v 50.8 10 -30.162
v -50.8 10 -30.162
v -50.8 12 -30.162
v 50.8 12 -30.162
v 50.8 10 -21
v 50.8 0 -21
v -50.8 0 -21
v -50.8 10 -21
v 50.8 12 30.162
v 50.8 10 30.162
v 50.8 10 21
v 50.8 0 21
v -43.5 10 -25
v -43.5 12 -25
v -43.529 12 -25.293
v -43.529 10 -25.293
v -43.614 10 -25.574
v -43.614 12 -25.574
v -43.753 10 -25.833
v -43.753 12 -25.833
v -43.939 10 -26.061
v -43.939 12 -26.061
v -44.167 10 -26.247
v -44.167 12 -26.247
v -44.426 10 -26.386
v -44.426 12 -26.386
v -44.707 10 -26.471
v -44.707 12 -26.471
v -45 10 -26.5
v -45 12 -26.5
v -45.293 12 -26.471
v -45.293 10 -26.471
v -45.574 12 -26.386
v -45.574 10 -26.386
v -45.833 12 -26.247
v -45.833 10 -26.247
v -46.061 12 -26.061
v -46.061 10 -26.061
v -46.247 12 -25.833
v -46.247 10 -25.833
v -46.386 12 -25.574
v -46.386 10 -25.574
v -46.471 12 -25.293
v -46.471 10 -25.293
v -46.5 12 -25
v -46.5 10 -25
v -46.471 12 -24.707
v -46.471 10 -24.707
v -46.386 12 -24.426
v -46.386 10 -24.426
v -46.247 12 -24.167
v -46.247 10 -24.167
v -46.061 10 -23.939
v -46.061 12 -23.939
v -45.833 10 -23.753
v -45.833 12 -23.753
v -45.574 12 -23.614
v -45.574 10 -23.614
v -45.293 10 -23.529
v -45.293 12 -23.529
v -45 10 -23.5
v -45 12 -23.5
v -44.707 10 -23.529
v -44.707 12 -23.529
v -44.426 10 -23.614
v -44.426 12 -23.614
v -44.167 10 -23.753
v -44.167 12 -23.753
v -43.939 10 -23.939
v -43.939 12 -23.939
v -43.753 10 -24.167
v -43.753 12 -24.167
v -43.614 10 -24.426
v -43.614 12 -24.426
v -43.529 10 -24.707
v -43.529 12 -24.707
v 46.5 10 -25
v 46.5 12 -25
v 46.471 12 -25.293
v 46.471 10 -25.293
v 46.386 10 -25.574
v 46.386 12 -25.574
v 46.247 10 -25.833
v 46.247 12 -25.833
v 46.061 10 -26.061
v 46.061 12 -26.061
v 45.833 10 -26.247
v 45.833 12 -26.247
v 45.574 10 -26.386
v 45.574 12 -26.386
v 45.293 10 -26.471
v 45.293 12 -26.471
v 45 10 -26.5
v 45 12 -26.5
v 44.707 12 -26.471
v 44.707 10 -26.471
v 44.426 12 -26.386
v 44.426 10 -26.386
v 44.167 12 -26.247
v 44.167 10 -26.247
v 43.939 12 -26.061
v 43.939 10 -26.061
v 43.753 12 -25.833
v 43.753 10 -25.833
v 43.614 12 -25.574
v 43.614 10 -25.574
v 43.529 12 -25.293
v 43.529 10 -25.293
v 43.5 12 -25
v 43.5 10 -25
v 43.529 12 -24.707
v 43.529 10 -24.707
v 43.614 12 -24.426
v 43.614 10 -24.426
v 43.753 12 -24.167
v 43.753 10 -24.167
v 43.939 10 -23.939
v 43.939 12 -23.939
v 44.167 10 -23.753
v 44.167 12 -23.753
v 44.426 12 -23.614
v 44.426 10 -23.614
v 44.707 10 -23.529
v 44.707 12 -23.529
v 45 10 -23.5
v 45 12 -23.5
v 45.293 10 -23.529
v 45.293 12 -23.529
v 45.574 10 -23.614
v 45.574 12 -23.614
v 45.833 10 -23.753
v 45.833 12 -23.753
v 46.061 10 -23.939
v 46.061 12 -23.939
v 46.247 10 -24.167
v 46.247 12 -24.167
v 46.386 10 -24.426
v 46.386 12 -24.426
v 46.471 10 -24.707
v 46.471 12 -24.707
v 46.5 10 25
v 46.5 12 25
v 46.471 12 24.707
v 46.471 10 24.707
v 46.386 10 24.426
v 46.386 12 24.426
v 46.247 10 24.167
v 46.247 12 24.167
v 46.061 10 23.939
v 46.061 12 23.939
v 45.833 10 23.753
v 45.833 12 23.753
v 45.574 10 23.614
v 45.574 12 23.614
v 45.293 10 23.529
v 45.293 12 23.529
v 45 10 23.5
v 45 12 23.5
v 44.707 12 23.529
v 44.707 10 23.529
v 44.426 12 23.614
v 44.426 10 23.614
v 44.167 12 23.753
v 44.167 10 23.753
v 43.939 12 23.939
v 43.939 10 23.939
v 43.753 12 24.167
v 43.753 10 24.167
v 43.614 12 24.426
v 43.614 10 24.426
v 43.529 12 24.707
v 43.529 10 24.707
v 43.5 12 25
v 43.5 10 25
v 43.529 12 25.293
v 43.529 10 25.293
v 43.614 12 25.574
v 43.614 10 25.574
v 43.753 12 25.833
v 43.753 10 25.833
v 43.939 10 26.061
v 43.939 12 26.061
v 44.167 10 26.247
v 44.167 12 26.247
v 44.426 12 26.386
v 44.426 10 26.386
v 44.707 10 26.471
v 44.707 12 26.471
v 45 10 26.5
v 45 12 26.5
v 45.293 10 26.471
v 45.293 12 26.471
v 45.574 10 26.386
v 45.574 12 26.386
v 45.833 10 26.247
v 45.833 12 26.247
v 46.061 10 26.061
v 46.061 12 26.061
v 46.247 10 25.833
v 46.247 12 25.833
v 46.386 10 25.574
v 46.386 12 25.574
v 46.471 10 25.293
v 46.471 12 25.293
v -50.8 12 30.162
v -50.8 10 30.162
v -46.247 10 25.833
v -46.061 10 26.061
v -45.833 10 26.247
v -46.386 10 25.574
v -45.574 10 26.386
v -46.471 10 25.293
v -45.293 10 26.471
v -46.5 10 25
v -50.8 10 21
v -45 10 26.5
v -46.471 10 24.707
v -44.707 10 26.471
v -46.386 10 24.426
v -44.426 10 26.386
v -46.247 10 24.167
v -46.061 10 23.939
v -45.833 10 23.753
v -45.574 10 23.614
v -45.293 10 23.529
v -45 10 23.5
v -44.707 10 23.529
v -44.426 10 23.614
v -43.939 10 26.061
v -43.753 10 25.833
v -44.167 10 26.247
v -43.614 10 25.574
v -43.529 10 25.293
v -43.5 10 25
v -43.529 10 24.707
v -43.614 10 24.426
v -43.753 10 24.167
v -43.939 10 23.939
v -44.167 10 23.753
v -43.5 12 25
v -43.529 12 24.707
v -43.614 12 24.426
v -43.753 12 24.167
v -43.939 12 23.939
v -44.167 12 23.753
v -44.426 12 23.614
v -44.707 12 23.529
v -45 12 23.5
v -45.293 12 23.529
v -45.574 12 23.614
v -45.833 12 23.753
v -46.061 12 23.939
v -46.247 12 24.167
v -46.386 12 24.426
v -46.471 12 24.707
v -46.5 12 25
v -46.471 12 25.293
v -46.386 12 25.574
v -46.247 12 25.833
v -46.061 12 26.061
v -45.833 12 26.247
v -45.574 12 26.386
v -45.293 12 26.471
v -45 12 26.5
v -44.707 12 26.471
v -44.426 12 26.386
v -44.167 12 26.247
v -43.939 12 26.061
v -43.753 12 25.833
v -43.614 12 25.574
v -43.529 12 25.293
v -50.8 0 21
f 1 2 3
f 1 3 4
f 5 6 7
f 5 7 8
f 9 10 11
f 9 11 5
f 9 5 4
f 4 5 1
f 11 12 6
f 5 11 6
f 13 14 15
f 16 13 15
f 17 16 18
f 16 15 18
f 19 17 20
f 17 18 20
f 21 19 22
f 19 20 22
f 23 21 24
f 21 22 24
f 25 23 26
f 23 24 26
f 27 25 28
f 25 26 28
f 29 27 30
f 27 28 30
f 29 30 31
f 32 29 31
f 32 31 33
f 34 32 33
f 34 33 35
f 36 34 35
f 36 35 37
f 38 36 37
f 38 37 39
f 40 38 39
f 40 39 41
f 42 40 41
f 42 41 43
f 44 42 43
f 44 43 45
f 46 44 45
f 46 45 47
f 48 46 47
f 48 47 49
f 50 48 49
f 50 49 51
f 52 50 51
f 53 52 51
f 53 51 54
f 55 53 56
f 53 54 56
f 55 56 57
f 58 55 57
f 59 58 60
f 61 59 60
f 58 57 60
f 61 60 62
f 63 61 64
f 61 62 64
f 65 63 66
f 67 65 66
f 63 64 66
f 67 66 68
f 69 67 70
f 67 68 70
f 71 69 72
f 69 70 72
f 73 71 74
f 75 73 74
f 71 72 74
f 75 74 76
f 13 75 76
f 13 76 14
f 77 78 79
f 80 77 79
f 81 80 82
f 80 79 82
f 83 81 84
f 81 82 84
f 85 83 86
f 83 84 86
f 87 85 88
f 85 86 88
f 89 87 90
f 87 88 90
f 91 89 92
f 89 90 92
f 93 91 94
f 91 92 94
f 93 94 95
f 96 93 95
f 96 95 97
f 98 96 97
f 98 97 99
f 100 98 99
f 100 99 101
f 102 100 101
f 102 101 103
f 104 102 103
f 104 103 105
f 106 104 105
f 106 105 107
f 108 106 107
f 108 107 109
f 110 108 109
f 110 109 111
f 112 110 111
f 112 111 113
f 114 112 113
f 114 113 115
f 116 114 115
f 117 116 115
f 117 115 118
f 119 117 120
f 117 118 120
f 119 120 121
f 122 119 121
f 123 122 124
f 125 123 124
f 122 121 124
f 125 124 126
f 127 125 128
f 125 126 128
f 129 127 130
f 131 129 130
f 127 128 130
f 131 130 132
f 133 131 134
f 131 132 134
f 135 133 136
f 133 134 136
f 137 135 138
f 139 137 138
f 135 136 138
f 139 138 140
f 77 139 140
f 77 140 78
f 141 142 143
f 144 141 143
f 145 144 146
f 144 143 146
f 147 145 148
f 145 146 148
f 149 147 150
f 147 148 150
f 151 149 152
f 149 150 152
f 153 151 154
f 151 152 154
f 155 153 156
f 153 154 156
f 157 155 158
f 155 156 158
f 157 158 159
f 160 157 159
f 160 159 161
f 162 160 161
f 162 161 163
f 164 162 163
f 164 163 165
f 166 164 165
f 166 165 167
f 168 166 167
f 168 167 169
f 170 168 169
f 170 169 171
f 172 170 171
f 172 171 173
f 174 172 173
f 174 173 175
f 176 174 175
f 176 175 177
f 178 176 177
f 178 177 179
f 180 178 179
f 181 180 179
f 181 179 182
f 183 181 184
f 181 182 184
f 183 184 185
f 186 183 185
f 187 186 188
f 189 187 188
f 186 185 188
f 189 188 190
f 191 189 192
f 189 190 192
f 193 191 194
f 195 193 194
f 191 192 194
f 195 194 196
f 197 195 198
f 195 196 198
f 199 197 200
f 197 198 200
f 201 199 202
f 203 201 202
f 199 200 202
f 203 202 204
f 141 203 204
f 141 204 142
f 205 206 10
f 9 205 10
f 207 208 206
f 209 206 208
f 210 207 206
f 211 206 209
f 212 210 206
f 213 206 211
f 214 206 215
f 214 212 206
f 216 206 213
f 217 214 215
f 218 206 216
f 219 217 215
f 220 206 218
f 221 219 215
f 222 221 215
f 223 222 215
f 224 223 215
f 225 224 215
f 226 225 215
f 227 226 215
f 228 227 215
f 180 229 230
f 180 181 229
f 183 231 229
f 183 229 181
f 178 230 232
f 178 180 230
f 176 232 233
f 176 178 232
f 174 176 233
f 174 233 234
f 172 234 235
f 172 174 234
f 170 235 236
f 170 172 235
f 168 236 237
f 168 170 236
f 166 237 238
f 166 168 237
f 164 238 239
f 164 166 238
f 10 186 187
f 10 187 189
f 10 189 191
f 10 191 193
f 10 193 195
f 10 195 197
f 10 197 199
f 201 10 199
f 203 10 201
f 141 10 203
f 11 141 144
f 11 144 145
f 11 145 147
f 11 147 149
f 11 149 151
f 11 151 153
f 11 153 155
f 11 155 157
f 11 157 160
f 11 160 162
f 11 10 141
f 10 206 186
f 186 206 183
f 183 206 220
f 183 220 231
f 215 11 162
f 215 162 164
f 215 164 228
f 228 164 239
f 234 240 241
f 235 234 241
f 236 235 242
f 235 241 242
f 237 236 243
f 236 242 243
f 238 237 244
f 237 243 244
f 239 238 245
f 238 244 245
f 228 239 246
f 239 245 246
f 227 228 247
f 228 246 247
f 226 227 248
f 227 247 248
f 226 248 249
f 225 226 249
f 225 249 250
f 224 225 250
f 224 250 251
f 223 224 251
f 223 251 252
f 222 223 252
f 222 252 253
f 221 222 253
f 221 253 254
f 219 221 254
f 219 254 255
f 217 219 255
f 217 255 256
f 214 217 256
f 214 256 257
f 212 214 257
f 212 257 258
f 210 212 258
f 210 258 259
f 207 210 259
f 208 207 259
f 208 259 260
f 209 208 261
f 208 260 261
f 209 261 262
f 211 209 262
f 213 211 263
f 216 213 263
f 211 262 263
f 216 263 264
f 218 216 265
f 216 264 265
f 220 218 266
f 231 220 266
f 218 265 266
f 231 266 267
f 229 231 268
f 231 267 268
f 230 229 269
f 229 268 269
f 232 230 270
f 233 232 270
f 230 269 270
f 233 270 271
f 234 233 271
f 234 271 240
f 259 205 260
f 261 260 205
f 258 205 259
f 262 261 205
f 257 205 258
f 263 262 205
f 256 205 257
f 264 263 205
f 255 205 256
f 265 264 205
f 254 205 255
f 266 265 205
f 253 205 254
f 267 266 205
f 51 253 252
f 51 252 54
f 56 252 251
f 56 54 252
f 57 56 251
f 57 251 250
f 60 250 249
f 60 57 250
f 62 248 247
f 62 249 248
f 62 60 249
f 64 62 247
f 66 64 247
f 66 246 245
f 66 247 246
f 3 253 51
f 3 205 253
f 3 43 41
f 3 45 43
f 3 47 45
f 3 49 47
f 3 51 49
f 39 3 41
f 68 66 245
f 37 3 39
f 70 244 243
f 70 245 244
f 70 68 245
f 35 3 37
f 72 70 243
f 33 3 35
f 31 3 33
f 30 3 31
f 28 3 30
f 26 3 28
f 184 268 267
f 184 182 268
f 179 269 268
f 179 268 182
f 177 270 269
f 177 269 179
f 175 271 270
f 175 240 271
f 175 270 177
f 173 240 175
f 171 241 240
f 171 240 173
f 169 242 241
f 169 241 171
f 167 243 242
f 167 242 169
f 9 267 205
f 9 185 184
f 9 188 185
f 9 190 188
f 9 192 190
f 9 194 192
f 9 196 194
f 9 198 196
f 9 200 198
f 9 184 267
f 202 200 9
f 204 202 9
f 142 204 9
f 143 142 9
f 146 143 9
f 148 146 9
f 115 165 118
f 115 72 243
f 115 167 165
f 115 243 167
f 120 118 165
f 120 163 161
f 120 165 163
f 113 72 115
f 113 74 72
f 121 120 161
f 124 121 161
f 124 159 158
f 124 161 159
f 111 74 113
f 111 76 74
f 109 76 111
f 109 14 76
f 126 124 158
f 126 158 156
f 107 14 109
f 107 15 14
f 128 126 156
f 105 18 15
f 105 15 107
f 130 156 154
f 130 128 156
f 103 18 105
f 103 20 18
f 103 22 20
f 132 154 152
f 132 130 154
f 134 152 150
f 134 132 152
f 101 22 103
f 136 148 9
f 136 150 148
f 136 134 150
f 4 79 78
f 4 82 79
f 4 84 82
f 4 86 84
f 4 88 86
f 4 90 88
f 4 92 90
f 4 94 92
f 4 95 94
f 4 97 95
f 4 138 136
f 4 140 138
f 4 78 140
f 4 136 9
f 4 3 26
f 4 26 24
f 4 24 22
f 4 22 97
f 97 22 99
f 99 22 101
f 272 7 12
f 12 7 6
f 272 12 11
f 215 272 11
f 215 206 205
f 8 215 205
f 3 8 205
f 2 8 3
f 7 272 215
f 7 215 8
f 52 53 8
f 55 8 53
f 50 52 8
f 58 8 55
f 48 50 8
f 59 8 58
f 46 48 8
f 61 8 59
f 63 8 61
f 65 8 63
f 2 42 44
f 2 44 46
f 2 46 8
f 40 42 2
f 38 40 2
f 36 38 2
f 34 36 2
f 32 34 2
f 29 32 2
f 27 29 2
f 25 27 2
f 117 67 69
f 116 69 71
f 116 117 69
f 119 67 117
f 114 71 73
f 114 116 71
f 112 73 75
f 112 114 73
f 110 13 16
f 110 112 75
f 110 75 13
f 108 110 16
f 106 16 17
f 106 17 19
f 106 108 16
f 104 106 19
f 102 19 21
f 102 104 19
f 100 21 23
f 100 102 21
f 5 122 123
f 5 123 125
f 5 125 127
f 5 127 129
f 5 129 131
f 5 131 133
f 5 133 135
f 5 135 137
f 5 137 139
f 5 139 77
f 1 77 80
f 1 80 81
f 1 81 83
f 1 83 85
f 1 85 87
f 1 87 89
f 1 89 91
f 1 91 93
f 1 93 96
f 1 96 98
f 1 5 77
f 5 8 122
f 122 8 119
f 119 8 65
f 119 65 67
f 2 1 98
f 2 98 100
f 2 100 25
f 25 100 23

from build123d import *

# Parameters (mm, degrees)
SKETCH1_W           = 101.6
SKETCH1_H           = 60.325
BOSS_EXTRUDE1_DEPTH = 12
SKETCH2_W           = 9.1625
SKETCH2_H           = 10
CUT_EXTRUDE1_DEPTH  = 102.6
SKETCH3_R           = 1.5
CUT_EXTRUDE2_DEPTH  = 13


with BuildPart() as part:
    # Sketch1 → Boss-Extrude1 (new body)
    with BuildSketch(Plane(origin=(0, 0, 0), x_dir=(1, 0, 0), z_dir=(0, 1, 0))):
        Rectangle(SKETCH1_W, SKETCH1_H)
    extrude(amount=BOSS_EXTRUDE1_DEPTH)

    # Sketch2 → Cut-Extrude1 (cut, through all)
    with BuildSketch(Plane(origin=(50.8, 0, 0), x_dir=(0, 0, -1), z_dir=(1, 0, 0))):
        with Locations((-25.58125, 5)):
            Rectangle(SKETCH2_W, SKETCH2_H)
        with Locations((25.58125, 5)):
            Rectangle(SKETCH2_W, SKETCH2_H)
    extrude(amount=-CUT_EXTRUDE1_DEPTH, mode=Mode.SUBTRACT)

    # Sketch3 → Cut-Extrude2 (cut, through all)
    with BuildSketch(Plane(origin=(0, 12, 0), x_dir=(1, 0, 0), z_dir=(0, 1, 0))):
        with Locations((-45, 25)):
            Circle(SKETCH3_R)
        with Locations((-45, -25)):
            Circle(SKETCH3_R)
        with Locations((45, -25)):
            Circle(SKETCH3_R)
        with Locations((45, 25)):
            Circle(SKETCH3_R)
    extrude(amount=-CUT_EXTRUDE2_DEPTH, mode=Mode.SUBTRACT)


solid = part.part
